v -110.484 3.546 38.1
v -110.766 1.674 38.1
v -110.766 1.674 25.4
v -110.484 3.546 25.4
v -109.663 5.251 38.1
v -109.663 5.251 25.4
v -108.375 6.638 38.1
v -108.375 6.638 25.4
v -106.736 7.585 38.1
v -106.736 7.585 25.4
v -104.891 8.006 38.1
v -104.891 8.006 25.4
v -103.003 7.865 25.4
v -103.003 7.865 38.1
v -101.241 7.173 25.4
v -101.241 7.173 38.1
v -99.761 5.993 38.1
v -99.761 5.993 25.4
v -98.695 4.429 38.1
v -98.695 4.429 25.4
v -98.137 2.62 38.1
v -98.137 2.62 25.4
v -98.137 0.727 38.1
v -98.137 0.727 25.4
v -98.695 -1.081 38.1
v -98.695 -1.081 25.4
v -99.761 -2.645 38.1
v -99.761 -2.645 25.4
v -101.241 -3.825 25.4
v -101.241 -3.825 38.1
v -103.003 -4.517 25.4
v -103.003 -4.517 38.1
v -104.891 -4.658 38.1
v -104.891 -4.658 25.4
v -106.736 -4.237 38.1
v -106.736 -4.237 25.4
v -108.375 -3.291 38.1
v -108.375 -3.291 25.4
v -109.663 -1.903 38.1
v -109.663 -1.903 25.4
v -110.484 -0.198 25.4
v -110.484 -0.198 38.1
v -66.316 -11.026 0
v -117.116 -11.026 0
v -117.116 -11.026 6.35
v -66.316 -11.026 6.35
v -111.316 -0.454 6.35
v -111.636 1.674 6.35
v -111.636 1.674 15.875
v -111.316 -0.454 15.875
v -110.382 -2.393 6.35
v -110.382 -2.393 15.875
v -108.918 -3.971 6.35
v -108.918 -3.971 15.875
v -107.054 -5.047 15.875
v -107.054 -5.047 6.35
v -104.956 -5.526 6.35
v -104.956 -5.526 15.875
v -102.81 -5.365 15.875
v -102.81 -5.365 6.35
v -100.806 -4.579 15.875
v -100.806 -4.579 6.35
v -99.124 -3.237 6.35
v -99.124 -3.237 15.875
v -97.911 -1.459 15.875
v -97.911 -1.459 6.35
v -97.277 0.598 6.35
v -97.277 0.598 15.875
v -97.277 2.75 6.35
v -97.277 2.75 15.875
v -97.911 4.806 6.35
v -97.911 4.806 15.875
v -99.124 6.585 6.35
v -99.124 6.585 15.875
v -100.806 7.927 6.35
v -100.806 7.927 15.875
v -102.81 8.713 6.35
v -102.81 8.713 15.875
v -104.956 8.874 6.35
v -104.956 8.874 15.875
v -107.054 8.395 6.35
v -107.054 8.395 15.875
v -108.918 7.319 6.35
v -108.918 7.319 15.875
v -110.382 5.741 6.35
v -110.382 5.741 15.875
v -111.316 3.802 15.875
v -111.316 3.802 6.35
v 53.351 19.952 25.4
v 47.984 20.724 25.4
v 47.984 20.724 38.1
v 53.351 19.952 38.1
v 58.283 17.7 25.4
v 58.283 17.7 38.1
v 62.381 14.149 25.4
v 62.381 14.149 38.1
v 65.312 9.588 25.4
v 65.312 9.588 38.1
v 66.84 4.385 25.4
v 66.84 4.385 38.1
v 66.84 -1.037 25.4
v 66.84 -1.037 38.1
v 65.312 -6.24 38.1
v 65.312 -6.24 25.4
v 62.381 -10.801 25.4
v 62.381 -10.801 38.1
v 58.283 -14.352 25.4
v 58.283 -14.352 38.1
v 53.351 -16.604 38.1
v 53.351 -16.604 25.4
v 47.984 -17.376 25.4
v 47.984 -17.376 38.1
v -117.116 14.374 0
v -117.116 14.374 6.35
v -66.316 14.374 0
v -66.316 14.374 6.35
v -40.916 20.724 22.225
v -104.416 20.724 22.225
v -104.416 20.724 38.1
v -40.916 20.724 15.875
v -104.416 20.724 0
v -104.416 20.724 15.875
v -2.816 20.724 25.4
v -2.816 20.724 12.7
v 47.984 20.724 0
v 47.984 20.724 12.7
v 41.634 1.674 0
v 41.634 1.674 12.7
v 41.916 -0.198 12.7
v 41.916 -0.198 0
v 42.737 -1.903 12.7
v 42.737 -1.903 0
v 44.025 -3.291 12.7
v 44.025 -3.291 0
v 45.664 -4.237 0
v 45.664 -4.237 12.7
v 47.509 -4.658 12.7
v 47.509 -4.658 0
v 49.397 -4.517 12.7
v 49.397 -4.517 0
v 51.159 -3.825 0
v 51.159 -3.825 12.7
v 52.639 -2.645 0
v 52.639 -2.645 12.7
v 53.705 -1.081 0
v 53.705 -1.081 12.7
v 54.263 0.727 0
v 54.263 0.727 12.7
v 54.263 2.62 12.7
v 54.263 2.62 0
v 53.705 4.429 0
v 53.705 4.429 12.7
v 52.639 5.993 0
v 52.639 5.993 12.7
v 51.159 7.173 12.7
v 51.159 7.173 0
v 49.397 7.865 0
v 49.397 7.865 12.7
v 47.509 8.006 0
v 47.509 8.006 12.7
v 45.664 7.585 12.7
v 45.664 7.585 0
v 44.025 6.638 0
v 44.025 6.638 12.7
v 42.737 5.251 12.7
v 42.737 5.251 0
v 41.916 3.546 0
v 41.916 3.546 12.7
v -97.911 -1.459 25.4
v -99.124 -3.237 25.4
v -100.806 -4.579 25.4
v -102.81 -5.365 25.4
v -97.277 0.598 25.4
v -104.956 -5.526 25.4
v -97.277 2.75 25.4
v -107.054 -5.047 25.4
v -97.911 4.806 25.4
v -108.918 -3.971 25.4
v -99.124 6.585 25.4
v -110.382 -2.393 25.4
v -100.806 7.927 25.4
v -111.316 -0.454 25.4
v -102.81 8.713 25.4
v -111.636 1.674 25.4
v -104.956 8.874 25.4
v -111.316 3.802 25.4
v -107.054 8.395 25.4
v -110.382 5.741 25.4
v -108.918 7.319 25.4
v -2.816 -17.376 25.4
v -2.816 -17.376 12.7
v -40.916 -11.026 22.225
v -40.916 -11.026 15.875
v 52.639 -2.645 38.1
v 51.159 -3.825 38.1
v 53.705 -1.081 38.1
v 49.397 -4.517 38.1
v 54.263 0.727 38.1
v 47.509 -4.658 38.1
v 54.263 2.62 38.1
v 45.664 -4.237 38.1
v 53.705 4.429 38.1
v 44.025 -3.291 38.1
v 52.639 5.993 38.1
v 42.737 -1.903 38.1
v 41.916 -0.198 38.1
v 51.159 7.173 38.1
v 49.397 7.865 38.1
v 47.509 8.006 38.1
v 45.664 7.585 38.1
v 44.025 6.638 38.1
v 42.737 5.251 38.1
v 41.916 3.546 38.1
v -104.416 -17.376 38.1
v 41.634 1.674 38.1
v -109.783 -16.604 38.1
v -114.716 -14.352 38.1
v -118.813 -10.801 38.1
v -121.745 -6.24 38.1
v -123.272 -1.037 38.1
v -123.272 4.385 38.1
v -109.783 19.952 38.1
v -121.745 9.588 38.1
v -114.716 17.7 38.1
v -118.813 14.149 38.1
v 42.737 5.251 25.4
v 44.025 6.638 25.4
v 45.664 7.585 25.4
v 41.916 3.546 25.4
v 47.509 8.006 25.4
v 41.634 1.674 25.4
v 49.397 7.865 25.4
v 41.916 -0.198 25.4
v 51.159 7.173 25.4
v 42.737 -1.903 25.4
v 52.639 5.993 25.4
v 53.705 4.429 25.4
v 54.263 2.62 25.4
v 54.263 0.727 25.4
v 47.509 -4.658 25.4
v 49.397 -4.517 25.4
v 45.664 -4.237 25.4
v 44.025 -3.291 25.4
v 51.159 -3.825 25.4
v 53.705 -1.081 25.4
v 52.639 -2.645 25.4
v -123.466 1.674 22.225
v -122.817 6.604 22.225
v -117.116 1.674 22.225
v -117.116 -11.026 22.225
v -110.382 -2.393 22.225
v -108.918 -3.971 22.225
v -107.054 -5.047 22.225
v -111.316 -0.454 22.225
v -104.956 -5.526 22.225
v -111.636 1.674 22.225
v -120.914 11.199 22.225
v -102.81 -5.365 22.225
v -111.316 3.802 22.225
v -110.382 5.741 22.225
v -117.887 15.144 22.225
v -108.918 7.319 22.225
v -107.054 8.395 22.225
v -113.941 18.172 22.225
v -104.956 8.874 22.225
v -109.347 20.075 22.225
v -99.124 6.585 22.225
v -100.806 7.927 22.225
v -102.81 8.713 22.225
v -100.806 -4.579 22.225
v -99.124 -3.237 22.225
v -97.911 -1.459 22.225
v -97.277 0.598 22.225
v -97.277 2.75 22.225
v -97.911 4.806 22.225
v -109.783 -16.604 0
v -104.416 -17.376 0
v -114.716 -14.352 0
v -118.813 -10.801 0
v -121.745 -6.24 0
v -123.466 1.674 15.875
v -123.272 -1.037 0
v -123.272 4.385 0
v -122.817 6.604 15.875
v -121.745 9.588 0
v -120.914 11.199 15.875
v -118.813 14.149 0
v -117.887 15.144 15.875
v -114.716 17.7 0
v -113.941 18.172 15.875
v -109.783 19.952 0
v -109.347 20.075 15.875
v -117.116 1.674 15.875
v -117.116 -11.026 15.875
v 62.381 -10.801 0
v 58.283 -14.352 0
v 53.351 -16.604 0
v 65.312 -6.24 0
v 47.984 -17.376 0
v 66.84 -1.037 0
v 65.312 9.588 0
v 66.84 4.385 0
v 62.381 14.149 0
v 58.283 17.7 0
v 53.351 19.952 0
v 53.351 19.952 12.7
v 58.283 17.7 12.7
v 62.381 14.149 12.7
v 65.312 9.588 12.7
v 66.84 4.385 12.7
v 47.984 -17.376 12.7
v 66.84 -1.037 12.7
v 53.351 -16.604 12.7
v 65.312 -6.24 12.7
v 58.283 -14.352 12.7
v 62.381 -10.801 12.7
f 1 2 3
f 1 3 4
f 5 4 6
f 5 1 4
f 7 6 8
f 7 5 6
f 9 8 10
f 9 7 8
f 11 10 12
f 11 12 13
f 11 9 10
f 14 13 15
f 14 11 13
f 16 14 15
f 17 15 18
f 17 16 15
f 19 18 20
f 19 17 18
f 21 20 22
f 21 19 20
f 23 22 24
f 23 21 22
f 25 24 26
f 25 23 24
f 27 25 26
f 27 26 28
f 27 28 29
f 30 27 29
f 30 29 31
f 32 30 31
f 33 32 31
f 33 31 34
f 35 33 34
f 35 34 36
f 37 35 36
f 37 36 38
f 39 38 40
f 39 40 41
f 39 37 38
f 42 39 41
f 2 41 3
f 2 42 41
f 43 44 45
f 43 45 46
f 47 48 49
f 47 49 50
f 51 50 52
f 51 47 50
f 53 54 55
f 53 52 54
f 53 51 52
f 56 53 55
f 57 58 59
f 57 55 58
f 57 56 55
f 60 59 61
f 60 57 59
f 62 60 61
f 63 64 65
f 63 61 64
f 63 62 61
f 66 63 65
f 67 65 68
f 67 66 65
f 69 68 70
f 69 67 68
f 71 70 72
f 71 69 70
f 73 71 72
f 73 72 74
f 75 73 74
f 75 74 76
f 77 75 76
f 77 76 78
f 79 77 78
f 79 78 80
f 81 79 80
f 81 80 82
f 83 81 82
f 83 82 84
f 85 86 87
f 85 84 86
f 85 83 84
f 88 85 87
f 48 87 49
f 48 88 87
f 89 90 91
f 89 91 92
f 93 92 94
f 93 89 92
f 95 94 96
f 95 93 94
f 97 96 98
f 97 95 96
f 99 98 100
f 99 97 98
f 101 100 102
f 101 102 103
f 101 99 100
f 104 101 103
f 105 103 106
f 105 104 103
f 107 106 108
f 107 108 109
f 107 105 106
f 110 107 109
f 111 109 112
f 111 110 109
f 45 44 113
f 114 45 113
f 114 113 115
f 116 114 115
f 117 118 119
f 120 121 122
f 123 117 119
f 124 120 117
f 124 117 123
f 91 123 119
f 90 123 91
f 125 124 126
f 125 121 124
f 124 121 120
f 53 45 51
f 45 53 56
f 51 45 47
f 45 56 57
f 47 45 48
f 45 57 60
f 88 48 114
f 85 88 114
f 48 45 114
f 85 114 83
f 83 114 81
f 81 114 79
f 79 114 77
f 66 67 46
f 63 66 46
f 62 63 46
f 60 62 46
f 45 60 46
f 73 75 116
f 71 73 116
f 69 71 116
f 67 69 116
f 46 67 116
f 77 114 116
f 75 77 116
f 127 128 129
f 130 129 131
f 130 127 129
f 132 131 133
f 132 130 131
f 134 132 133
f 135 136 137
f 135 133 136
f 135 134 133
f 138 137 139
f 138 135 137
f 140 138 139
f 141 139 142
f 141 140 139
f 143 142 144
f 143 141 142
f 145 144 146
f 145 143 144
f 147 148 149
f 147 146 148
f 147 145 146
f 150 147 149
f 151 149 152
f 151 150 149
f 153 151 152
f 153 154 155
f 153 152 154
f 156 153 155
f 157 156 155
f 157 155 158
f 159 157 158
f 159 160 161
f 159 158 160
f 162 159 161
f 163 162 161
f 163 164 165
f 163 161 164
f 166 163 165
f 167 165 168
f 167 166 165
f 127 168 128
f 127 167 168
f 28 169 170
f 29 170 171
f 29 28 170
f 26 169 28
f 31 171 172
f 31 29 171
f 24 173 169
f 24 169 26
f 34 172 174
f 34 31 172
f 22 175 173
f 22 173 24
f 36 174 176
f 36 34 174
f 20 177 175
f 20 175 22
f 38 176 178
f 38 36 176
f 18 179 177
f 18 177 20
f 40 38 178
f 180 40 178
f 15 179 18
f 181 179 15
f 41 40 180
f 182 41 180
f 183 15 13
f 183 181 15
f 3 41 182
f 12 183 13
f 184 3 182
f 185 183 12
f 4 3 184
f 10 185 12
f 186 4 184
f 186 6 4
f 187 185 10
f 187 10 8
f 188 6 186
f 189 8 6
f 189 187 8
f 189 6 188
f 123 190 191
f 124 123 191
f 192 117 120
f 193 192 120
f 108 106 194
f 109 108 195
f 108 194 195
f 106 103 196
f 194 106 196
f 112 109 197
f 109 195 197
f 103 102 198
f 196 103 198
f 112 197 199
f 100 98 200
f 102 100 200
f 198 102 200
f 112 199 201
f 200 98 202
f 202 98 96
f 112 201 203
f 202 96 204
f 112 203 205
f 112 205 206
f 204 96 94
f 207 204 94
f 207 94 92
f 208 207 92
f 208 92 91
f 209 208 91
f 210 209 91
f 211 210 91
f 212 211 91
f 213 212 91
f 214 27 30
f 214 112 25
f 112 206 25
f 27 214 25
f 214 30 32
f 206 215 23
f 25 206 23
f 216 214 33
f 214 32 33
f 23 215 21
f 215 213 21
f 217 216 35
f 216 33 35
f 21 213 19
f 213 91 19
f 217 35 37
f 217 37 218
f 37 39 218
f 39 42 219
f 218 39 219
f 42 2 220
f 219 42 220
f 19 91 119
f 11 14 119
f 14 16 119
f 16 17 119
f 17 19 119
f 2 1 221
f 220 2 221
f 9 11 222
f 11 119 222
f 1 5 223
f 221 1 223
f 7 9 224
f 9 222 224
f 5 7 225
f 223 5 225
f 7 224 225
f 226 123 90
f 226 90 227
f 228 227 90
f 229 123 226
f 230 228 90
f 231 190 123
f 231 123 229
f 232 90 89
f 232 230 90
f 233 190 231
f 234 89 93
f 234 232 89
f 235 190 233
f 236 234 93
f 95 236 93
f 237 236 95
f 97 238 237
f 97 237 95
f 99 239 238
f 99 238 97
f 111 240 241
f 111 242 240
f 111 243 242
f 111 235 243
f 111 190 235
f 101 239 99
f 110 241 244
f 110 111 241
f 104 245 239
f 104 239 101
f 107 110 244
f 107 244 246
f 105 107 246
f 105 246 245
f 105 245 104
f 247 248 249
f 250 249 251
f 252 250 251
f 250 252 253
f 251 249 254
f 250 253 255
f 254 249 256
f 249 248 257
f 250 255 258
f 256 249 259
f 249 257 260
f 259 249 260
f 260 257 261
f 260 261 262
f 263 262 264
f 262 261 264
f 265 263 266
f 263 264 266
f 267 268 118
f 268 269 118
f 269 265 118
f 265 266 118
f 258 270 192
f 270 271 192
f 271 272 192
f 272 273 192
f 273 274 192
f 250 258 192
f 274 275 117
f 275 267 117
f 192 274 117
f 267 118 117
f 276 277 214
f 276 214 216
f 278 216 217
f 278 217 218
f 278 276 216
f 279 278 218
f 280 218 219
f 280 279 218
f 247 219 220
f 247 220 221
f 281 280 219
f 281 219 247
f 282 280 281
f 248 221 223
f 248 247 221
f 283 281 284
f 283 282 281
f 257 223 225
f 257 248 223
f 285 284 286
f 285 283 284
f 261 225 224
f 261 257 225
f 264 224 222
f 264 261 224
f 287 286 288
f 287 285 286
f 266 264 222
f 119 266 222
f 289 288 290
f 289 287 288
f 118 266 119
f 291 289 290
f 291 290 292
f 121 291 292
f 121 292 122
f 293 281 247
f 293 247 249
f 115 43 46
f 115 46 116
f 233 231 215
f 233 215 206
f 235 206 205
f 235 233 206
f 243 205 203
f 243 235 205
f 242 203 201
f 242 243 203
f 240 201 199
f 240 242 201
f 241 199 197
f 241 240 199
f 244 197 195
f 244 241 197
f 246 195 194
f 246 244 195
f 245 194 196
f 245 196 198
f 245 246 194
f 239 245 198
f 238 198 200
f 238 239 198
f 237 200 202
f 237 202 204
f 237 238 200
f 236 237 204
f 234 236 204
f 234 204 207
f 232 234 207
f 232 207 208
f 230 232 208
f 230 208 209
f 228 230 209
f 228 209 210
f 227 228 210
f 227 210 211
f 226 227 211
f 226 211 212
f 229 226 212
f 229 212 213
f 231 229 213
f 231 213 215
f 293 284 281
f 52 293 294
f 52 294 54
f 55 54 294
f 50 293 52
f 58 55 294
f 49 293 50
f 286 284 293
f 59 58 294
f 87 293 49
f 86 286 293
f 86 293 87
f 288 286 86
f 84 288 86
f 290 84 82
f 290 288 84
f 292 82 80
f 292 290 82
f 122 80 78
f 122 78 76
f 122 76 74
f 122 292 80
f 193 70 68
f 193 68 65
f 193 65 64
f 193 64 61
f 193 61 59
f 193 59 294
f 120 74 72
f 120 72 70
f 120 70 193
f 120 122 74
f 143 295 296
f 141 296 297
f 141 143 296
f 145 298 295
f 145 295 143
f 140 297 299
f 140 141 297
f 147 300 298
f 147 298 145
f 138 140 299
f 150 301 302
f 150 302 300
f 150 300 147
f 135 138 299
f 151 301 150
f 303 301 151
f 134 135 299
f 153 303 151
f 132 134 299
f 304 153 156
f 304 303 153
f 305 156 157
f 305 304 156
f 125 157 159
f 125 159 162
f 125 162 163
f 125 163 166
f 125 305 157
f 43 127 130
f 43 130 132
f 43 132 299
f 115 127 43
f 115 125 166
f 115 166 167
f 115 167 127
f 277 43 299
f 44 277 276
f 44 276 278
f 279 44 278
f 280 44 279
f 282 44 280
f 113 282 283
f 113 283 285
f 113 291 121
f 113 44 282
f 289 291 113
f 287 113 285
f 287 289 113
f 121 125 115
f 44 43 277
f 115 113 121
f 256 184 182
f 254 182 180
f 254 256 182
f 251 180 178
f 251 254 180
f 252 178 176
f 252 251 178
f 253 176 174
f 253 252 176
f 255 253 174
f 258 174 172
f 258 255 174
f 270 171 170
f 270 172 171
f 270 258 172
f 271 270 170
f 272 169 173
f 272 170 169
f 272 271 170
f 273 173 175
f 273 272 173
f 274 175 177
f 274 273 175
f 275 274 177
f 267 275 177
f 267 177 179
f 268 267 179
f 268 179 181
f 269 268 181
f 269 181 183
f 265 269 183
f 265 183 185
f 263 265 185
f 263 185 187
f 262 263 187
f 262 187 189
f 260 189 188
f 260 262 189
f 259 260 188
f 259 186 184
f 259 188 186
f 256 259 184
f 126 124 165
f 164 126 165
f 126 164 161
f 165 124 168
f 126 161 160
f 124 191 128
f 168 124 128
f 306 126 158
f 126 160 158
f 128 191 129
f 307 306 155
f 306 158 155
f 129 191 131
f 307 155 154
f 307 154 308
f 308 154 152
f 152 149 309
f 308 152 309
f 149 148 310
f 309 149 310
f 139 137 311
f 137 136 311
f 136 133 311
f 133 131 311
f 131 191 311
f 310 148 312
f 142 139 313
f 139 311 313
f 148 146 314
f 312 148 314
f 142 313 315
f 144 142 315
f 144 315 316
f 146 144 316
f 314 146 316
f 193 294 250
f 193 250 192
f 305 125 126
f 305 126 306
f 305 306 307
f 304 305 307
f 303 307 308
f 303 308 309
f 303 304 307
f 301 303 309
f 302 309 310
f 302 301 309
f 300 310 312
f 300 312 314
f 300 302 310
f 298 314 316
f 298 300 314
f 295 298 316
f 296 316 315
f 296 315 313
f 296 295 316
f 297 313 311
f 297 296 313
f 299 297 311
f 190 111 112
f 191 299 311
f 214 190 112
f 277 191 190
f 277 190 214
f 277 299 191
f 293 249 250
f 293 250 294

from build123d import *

# Parameters (mm, degrees)
SKETCH1_R               = 6.35
SKETCH1_R_2             = 7.220009846
BOSS_EXTRUDE1_DEPTH     = 38.1
SKETCH2_W               = 50.8
SKETCH2_H               = 25.4
CUT_EXTRUDE1_DEPTH      = 6.35
CUT_EXTRUDE2_DEPTH      = 131.862598214
CUT_EXTRUDE2_DEPTH_BACK = 131.862598214
SKETCH5_W               = 76.2
SKETCH5_H               = 12.7
SKETCH4_W               = 76.2
SKETCH4_H               = 6.35
CUT_EXTRUDE3_DEPTH      = 31.75
SKETCH6_R               = 7.62
SKETCH6_R_2             = 6.35
EXTRUDE_THIN1_DEPTH     = 12.7
SKETCH7_W               = 32.699691946
SKETCH7_H               = 6.35
CUT_EXTRUDE4_DEPTH      = 19.05


with BuildPart() as part:
    # Sketch1 → Boss-Extrude1 (new body)
    with BuildSketch(Plane.XY):
        with BuildLine():
            Line((-104.416317992, 20.723849372), (47.983682008, 20.723849372))
            ThreePointArc((47.983682008, 20.723849372), (67.033682008, 1.673849372), (47.983682008, -17.376150628))
            Line((47.983682008, -17.376150628), (-104.416317992, -17.376150628))
            ThreePointArc((-104.416317992, -17.376150628), (-123.466317992, 1.673849372), (-104.416317992, 20.723849372))
        make_face()
        with Locations(Location((47.983682008, 1.673849372, 0), (0, 0, 180))):
            Circle(SKETCH1_R, mode=Mode.SUBTRACT)
        with Locations(Location((-104.416317992, 1.673849372, 0), (0, 0, 180))):
            Circle(SKETCH1_R_2, mode=Mode.SUBTRACT)
    extrude(amount=BOSS_EXTRUDE1_DEPTH)

    # Sketch2 → Cut-Extrude1 (cut)
    with BuildSketch(Plane.XY):
        with Locations((-91.716317992, 1.673849372)):
            Rectangle(SKETCH2_W, SKETCH2_H)
    extrude(amount=CUT_EXTRUDE1_DEPTH, mode=Mode.SUBTRACT)

    # Sketch5 → Cut-Extrude2 (cut, two sides: drawn at the far end of the back side and taken through both)
    with BuildSketch(Plane(origin=(0, 0, 0), x_dir=(1, 0, 0), z_dir=(0, 1, 0)).offset(-CUT_EXTRUDE2_DEPTH_BACK)):
        with Locations((35.283682008, -19.05)):
            Rectangle(SKETCH5_W, SKETCH5_H)
    extrude(amount=CUT_EXTRUDE2_DEPTH + CUT_EXTRUDE2_DEPTH_BACK, mode=Mode.SUBTRACT)

    # Sketch4 → Cut-Extrude3 (cut)
    with BuildSketch(Plane(origin=(0, 20.723849372, 0), x_dir=(1, 0, 0), z_dir=(0, 1, 0))):
        with Locations((-79.016317992, -19.05)):
            Rectangle(SKETCH4_W, SKETCH4_H)
    extrude(amount=-CUT_EXTRUDE3_DEPTH, mode=Mode.SUBTRACT)

    # Sketch6 → Extrude-Thin1 (add)
    with BuildSketch(Plane(origin=(0, 0, 38.1), x_dir=(-1, 0, 0), z_dir=(0, 0, -1))):
        with Locations((104.416317992, 1.673849372)):
            Circle(SKETCH6_R)
        with Locations((104.416317992, 1.673849372)):
            Circle(SKETCH6_R_2, mode=Mode.SUBTRACT)
    extrude(amount=EXTRUDE_THIN1_DEPTH)

    # Sketch7 → Cut-Extrude4 (cut)
    with BuildSketch(Plane(origin=(0, 20.723849372, 0), x_dir=(1, 0, 0), z_dir=(0, 1, 0))):
        with Locations((-118.381657109, -19.05)):
            Rectangle(SKETCH7_W, SKETCH7_H)
    extrude(amount=-CUT_EXTRUDE4_DEPTH, mode=Mode.SUBTRACT)


solid = part.part
